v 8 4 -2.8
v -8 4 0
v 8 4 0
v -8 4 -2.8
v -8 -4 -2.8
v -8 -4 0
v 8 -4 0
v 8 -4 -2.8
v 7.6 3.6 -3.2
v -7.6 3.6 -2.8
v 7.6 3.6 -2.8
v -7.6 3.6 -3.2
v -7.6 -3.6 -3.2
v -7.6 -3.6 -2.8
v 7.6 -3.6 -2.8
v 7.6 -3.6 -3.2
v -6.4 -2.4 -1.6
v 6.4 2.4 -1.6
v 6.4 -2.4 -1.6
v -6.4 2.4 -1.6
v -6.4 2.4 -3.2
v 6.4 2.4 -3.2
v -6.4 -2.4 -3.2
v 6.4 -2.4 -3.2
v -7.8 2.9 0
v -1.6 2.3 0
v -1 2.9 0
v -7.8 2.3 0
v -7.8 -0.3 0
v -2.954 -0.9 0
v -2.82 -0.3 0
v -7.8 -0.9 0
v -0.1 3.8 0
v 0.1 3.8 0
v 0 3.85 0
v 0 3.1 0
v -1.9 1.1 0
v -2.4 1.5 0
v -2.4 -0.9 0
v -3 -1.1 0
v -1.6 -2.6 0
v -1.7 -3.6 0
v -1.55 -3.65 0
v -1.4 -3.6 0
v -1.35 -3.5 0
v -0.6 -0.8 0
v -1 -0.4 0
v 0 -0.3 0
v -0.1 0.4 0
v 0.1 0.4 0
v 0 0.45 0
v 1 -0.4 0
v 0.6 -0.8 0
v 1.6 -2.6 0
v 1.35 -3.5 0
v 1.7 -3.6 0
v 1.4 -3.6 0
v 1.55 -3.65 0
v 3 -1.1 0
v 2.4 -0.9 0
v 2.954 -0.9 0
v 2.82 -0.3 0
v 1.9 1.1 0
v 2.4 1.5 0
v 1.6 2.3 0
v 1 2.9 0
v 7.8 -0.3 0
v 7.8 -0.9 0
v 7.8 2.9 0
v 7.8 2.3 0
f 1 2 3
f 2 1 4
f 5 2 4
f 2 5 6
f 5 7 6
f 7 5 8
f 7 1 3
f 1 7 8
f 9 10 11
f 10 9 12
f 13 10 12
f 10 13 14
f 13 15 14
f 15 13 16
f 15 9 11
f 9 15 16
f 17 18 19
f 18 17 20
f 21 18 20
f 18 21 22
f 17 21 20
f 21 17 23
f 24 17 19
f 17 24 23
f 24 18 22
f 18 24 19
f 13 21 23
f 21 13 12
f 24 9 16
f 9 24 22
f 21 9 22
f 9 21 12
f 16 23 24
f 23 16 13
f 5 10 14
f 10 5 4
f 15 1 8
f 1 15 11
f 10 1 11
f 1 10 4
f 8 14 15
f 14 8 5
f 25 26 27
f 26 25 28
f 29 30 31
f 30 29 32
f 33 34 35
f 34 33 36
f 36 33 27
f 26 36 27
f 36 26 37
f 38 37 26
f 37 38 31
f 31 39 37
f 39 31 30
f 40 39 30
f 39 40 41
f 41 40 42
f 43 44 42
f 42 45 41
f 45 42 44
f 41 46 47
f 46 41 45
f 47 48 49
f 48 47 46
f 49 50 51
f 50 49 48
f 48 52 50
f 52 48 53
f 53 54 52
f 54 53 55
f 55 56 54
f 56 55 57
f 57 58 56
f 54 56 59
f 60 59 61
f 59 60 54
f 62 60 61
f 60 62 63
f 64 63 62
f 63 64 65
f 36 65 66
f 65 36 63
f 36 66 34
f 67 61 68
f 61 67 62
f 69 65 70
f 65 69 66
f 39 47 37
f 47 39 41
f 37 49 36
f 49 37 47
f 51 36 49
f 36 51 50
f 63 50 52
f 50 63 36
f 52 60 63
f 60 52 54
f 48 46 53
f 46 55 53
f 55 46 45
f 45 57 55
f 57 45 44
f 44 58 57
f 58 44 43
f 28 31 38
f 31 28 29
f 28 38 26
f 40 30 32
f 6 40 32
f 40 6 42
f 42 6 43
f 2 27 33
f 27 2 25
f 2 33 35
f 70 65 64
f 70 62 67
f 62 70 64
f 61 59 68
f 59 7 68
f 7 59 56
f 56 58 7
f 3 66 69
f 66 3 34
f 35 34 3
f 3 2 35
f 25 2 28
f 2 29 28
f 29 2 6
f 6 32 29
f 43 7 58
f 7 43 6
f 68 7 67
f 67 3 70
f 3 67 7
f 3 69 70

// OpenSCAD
// file: ../p/box5.scad
use <../lib.scad>
function ldraw_lib__box5() = [
// 0 Box with 5 Faces and All Edges
// 0 Name: box5.dat
// 0 Author: James Jessiman
// 0 !LDRAW_ORG Primitive UPDATE 2012-01
// 0 !LICENSE Licensed under CC BY 4.0 : see CAreadme.txt
// 
// 0 BFC CERTIFY CCW
  [0,"BFC","CERTIFY"],
  [0,"BFC","CCW"],
// 
// 0 !HISTORY 2002-04-03 [sbliss] Modified for BFC compliance
// 0 !HISTORY 2002-04-25 [PTadmin] Official Update 2002-02
// 0 !HISTORY 2007-06-24 [PTadmin] Header formatted for Contributor Agreement
// 0 !HISTORY 2008-07-01 [PTadmin] Official Update 2008-01
// 0 !HISTORY 2012-02-16 [Philo] Changed to CCW
// 0 !HISTORY 2012-03-30 [PTadmin] Official Update 2012-01
// 
// 
// 2 24 1 1 1 -1 1 1
  [2,24,1,1,1,-1,1,1],
// 2 24 -1 1 1 -1 1 -1
  [2,24,-1,1,1,-1,1,-1],
// 2 24 -1 1 -1 1 1 -1
  [2,24,-1,1,-1,1,1,-1],
// 2 24 1 1 -1 1 1 1
  [2,24,1,1,-1,1,1,1],
// 2 24 1 0 1 -1 0 1
  [2,24,1,0,1,-1,0,1],
// 2 24 -1 0 1 -1 0 -1
  [2,24,-1,0,1,-1,0,-1],
// 2 24 -1 0 -1 1 0 -1
  [2,24,-1,0,-1,1,0,-1],
// 2 24 1 0 -1 1 0 1
  [2,24,1,0,-1,1,0,1],
// 2 24 1 0 1 1 1 1
  [2,24,1,0,1,1,1,1],
// 2 24 -1 0 1 -1 1 1
  [2,24,-1,0,1,-1,1,1],
// 2 24 1 0 -1 1 1 -1
  [2,24,1,0,-1,1,1,-1],
// 2 24 -1 0 -1 -1 1 -1
  [2,24,-1,0,-1,-1,1,-1],
// 4 16 -1 1 1 1 1 1 1 1 -1 -1 1 -1
  [4,16,-1,1,1,1,1,1,1,1,-1,-1,1,-1],
// 4 16 -1 1 1 -1 0 1 1 0 1 1 1 1
  [4,16,-1,1,1,-1,0,1,1,0,1,1,1,1],
// 4 16 -1 1 -1 -1 0 -1 -1 0 1 -1 1 1
  [4,16,-1,1,-1,-1,0,-1,-1,0,1,-1,1,1],
// 4 16 1 1 -1 1 0 -1 -1 0 -1 -1 1 -1
  [4,16,1,1,-1,1,0,-1,-1,0,-1,-1,1,-1],
// 4 16 1 1 1 1 0 1 1 0 -1 1 1 -1
  [4,16,1,1,1,1,0,1,1,0,-1,1,1,-1],
];
module ldraw_lib__box5(step=0, col=false, unit=2/5, alt=false, line=0.2, solid=!$preview)
    makepoly(ldraw_lib__box5(), step=step, col=col, unit=unit, alt=alt, line=line, solid=solid);
ldraw_lib__box5(line=0.2);
// file: ../p/box4.scad
use <../lib.scad>
function ldraw_lib__box4() = [
// 0 Box with 4 Faces (2 Parallel Pairs) and All Edges
// 0 Name: box4.dat
// 0 Author: James Jessiman
// 0 !LDRAW_ORG Primitive UPDATE 2012-01
// 0 !LICENSE Licensed under CC BY 4.0 : see CAreadme.txt
// 
// 0 BFC CERTIFY CCW
  [0,"BFC","CERTIFY"],
  [0,"BFC","CCW"],
// 
// 0 !HISTORY 2002-04-03 [sbliss] Modified for BFC compliance
// 0 !HISTORY 2002-04-25 [PTadmin] Official Update 2002-02
// 0 !HISTORY 2007-06-24 [PTadmin] Header formatted for Contributor Agreement
// 0 !HISTORY 2008-07-01 [PTadmin] Official Update 2008-01
// 0 !HISTORY 2012-02-16 [Philo] Changed to CCW
// 0 !HISTORY 2012-03-30 [PTadmin] Official Update 2012-01
// 
// 
// 2 24 1 1 1 -1 1 1
  [2,24,1,1,1,-1,1,1],
// 2 24 -1 1 1 -1 1 -1
  [2,24,-1,1,1,-1,1,-1],
// 2 24 -1 1 -1 1 1 -1
  [2,24,-1,1,-1,1,1,-1],
// 2 24 1 1 -1 1 1 1
  [2,24,1,1,-1,1,1,1],
// 2 24 1 0 1 -1 0 1
  [2,24,1,0,1,-1,0,1],
// 2 24 -1 0 1 -1 0 -1
  [2,24,-1,0,1,-1,0,-1],
// 2 24 -1 0 -1 1 0 -1
  [2,24,-1,0,-1,1,0,-1],
// 2 24 1 0 -1 1 0 1
  [2,24,1,0,-1,1,0,1],
// 2 24 1 0 1 1 1 1
  [2,24,1,0,1,1,1,1],
// 2 24 -1 0 1 -1 1 1
  [2,24,-1,0,1,-1,1,1],
// 2 24 1 0 -1 1 1 -1
  [2,24,1,0,-1,1,1,-1],
// 2 24 -1 0 -1 -1 1 -1
  [2,24,-1,0,-1,-1,1,-1],
// 4 16 -1 1 1 -1 0 1 1 0 1 1 1 1
  [4,16,-1,1,1,-1,0,1,1,0,1,1,1,1],
// 4 16 -1 1 -1 -1 0 -1 -1 0 1 -1 1 1
  [4,16,-1,1,-1,-1,0,-1,-1,0,1,-1,1,1],
// 4 16 1 1 -1 1 0 -1 -1 0 -1 -1 1 -1
  [4,16,1,1,-1,1,0,-1,-1,0,-1,-1,1,-1],
// 4 16 1 1 1 1 0 1 1 0 -1 1 1 -1
  [4,16,1,1,1,1,0,1,1,0,-1,1,1,-1],
];
module ldraw_lib__box4(step=0, col=false, unit=2/5, alt=false, line=0.2, solid=!$preview)
    makepoly(ldraw_lib__box4(), step=step, col=col, unit=unit, alt=alt, line=line, solid=solid);
ldraw_lib__box4(line=0.2);
// file: s/3069bs01.scad
use <../../lib.scad>
use <../../p/box4.scad>
use <../../p/box5.scad>
function ldraw_lib__s__3069bs01() = [
// 0 ~Tile  1 x  2 with Groove without Top Face
// 0 Name: s\3069bs01.dat
// 0 Author: Santeri Piippo [arezey]
// 0 !LDRAW_ORG Subpart UPDATE 2010-02
// 0 !LICENSE Licensed under CC BY 4.0 : see CAreadme.txt
// 
// 0 BFC CERTIFY CCW
  [0,"BFC","CERTIFY"],
  [0,"BFC","CCW"],
// 
// 0 !HISTORY 2010-07-05 [PTadmin] Official Update 2010-02
// 
// 
// 1 16 0 0 0 20 0 0 0 7 0 0 0 10 box4.dat
  [1,16,0,0,0,20,0,0,0,7,0,0,0,10, ldraw_lib__box4()],
// 1 16 0 7 0 19 0 0 0 1 0 0 0 9 box4.dat
  [1,16,0,7,0,19,0,0,0,1,0,0,0,9, ldraw_lib__box4()],
// 0 BFC INVERTNEXT
  [0,"BFC","INVERTNEXT"],
// 1 16 0 8 0 16 0 0 0 -4 0 0 0 6 box5.dat
  [1,16,0,8,0,16,0,0,0,-4,0,0,0,6, ldraw_lib__box5()],
// 4 16 -19 8 9 -16 8 6 -16 8 -6 -19 8 -9
  [4,16,-19,8,9,-16,8,6,-16,8,-6,-19,8,-9],
// 4 16 19 8 -9 16 8 -6 16 8 6 19 8 9
  [4,16,19,8,-9,16,8,-6,16,8,6,19,8,9],
// 4 16 19 8 9 16 8 6 -16 8 6 -19 8 9
  [4,16,19,8,9,16,8,6,-16,8,6,-19,8,9],
// 4 16 -19 8 -9 -16 8 -6 16 8 -6 19 8 -9
  [4,16,-19,8,-9,-16,8,-6,16,8,-6,19,8,-9],
// 4 16 -20 7 10 -19 7 9 -19 7 -9 -20 7 -10
  [4,16,-20,7,10,-19,7,9,-19,7,-9,-20,7,-10],
// 4 16 20 7 -10 19 7 -9 19 7 9 20 7 10
  [4,16,20,7,-10,19,7,-9,19,7,9,20,7,10],
// 4 16 20 7 10 19 7 9 -19 7 9 -20 7 10
  [4,16,20,7,10,19,7,9,-19,7,9,-20,7,10],
// 4 16 -20 7 -10 -19 7 -9 19 7 -9 20 7 -10
  [4,16,-20,7,-10,-19,7,-9,19,7,-9,20,7,-10],
// 0 //
];
module ldraw_lib__s__3069bs01(step=0, col=false, unit=2/5, alt=false, line=0.2, solid=!$preview)
    makepoly(ldraw_lib__s__3069bs01(), step=step, col=col, unit=unit, alt=alt, line=line, solid=solid);
ldraw_lib__s__3069bs01(line=0.2);
// main file
use <../lib.scad>
use <s/3069bs01.scad>
function ldraw_lib__3069bpzh() = [
// 0 Tile  1 x  2 with Black Aquaman Logo Pattern
// 0 Name: 3069bpzh.dat
// 0 Author: Vincent Messenet [Cheenzo]
// 0 !LDRAW_ORG Part UPDATE 2020-03
// 0 !LICENSE Licensed under CC BY 4.0 : see CAreadme.txt
// 
// 0 BFC CERTIFY CCW
  [0,"BFC","CERTIFY"],
  [0,"BFC","CCW"],
// 
// 0 !KEYWORDS Brickheadz, BrickLink 3069bpb630, Justice League, Set 41600
// 
// 0 !HISTORY 2020-12-29 [PTadmin] Official Update 2020-03
// 
// 
// 1 16 0 0 0 1 0 0 0 1 0 0 0 1 s\3069bs01.dat
  [1,16,0,0,0,1,0,0,0,1,0,0,0,1, ldraw_lib__s__3069bs01()],
// 
// 4 0 -2.5 0 7.25 -19.5 0 7.25 -19.5 0 5.75 -4 0 5.75
  [4,0,-2.5,0,7.25,-19.5,0,7.25,-19.5,0,5.75,-4,0,5.75],
// 4 0 -7.05 0 -.75 -19.5 0 -.75 -19.5 0 -2.25 -7.385 0 -2.25
  [4,0,-7.05,0,-.75,-19.5,0,-.75,-19.5,0,-2.25,-7.385,0,-2.25],
// 4 0 0 0 7.75 .25 0 9.5 0 0 9.625 -.25 0 9.5
  [4,0,0,0,7.75,.25,0,9.5,0,0,9.625,-.25,0,9.5],
// 3 0 0 0 7.75 -.25 0 9.5 -2.5 0 7.25
  [3,0,0,0,7.75,-.25,0,9.5,-2.5,0,7.25],
// 4 0 0 0 7.75 -2.5 0 7.25 -4 0 5.75 -4.75 0 2.75
  [4,0,0,0,7.75,-2.5,0,7.25,-4,0,5.75,-4.75,0,2.75],
// 4 0 -4 0 5.75 -6 0 3.75 -7.05 0 -.75 -4.75 0 2.75
  [4,0,-4,0,5.75,-6,0,3.75,-7.05,0,-.75,-4.75,0,2.75],
// 4 0 -6 0 -2.25 -4.75 0 2.75 -7.05 0 -.75 -7.385 0 -2.25
  [4,0,-6,0,-2.25,-4.75,0,2.75,-7.05,0,-.75,-7.385,0,-2.25],
// 4 0 -6 0 -2.25 -7.385 0 -2.25 -7.5 0 -2.75 -4 0 -6.5
  [4,0,-6,0,-2.25,-7.385,0,-2.25,-7.5,0,-2.75,-4,0,-6.5],
// 3 0 -4 0 -6.5 -7.5 0 -2.75 -4.25 0 -9
  [3,0,-4,0,-6.5,-7.5,0,-2.75,-4.25,0,-9],
// 3 0 -3.875 0 -9.125 -3.5 0 -9 -4.25 0 -9
  [3,0,-3.875,0,-9.125,-3.5,0,-9,-4.25,0,-9],
// 4 0 -3.375 0 -8.75 -4 0 -6.5 -4.25 0 -9 -3.5 0 -9
  [4,0,-3.375,0,-8.75,-4,0,-6.5,-4.25,0,-9,-3.5,0,-9],
// 4 0 -4 0 -6.5 -3.375 0 -8.75 -1.5 0 -2 -2.5 0 -1
  [4,0,-4,0,-6.5,-3.375,0,-8.75,-1.5,0,-2,-2.5,0,-1],
// 4 0 -2.5 0 -1 -1.5 0 -2 0 0 -.75 -.25 0 1
  [4,0,-2.5,0,-1,-1.5,0,-2,0,0,-.75,-.25,0,1],
// 4 0 -.25 0 1 0 0 -.75 .25 0 1 0 0 1.125
  [4,0,-.25,0,1,0,0,-.75,.25,0,1,0,0,1.125],
// 4 0 2.5 0 -1 .25 0 1 0 0 -.75 1.5 0 -2
  [4,0,2.5,0,-1,.25,0,1,0,0,-.75,1.5,0,-2],
// 4 0 3.375 0 -8.75 4 0 -6.5 2.5 0 -1 1.5 0 -2
  [4,0,3.375,0,-8.75,4,0,-6.5,2.5,0,-1,1.5,0,-2],
// 4 0 4.25 0 -9 4 0 -6.5 3.375 0 -8.75 3.5 0 -9
  [4,0,4.25,0,-9,4,0,-6.5,3.375,0,-8.75,3.5,0,-9],
// 3 0 3.5 0 -9 3.875 0 -9.125 4.25 0 -9
  [3,0,3.5,0,-9,3.875,0,-9.125,4.25,0,-9],
// 3 0 4 0 -6.5 4.25 0 -9 7.5 0 -2.75
  [3,0,4,0,-6.5,4.25,0,-9,7.5,0,-2.75],
// 4 0 7.5 0 -2.75 7.385 0 -2.25 6 0 -2.25 4 0 -6.5
  [4,0,7.5,0,-2.75,7.385,0,-2.25,6,0,-2.25,4,0,-6.5],
// 4 0 6 0 -2.25 7.385 0 -2.25 7.05 0 -.75 4.75 0 2.75
  [4,0,6,0,-2.25,7.385,0,-2.25,7.05,0,-.75,4.75,0,2.75],
// 4 0 4.75 0 2.75 7.05 0 -.75 6 0 3.75 4 0 5.75
  [4,0,4.75,0,2.75,7.05,0,-.75,6,0,3.75,4,0,5.75],
// 4 0 0 0 7.75 4.75 0 2.75 4 0 5.75 2.5 0 7.25
  [4,0,0,0,7.75,4.75,0,2.75,4,0,5.75,2.5,0,7.25],
// 3 0 0 0 7.75 2.5 0 7.25 .25 0 9.5
  [3,0,0,0,7.75,2.5,0,7.25,.25,0,9.5],
// 4 0 7.05 0 -.75 7.385 0 -2.25 19.5 0 -2.25 19.5 0 -.75
  [4,0,7.05,0,-.75,7.385,0,-2.25,19.5,0,-2.25,19.5,0,-.75],
// 4 0 19.5 0 5.75 19.5 0 7.25 2.5 0 7.25 4 0 5.75
  [4,0,19.5,0,5.75,19.5,0,7.25,2.5,0,7.25,4,0,5.75],
// 4 16 -4 0 -6.5 -2.5 0 -1 -4.75 0 2.75 -6 0 -2.25
  [4,16,-4,0,-6.5,-2.5,0,-1,-4.75,0,2.75,-6,0,-2.25],
// 4 16 -4.75 0 2.75 -2.5 0 -1 -.25 0 1 0 0 7.75
  [4,16,-4.75,0,2.75,-2.5,0,-1,-.25,0,1,0,0,7.75],
// 3 16 0 0 1.125 0 0 7.75 -.25 0 1
  [3,16,0,0,1.125,0,0,7.75,-.25,0,1],
// 3 16 0 0 7.75 0 0 1.125 .25 0 1
  [3,16,0,0,7.75,0,0,1.125,.25,0,1],
// 4 16 4.75 0 2.75 0 0 7.75 .25 0 1 2.5 0 -1
  [4,16,4.75,0,2.75,0,0,7.75,.25,0,1,2.5,0,-1],
// 4 16 6 0 -2.25 4.75 0 2.75 2.5 0 -1 4 0 -6.5
  [4,16,6,0,-2.25,4.75,0,2.75,2.5,0,-1,4,0,-6.5],
// 3 16 0 0 -.75 -1.5 0 -2 1.5 0 -2
  [3,16,0,0,-.75,-1.5,0,-2,1.5,0,-2],
// 4 16 3.375 0 -8.75 1.5 0 -2 -1.5 0 -2 -3.375 0 -8.75
  [4,16,3.375,0,-8.75,1.5,0,-2,-1.5,0,-2,-3.375,0,-8.75],
// 4 16 3.375 0 -8.75 -3.375 0 -8.75 -3.5 0 -9 3.5 0 -9
  [4,16,3.375,0,-8.75,-3.375,0,-8.75,-3.5,0,-9,3.5,0,-9],
// 4 16 -3.875 0 -9.125 3.875 0 -9.125 3.5 0 -9 -3.5 0 -9
  [4,16,-3.875,0,-9.125,3.875,0,-9.125,3.5,0,-9,-3.5,0,-9],
// 4 16 -6 0 3.75 -19.5 0 5.75 -19.5 0 -.75 -7.05 0 -.75
  [4,16,-6,0,3.75,-19.5,0,5.75,-19.5,0,-.75,-7.05,0,-.75],
// 3 16 -19.5 0 5.75 -6 0 3.75 -4 0 5.75
  [3,16,-19.5,0,5.75,-6,0,3.75,-4,0,5.75],
// 3 16 -7.5 0 -2.75 -7.385 0 -2.25 -19.5 0 -2.25
  [3,16,-7.5,0,-2.75,-7.385,0,-2.25,-19.5,0,-2.25],
// 4 16 -4.25 0 -9 -7.5 0 -2.75 -19.5 0 -2.25 -20 0 -10
  [4,16,-4.25,0,-9,-7.5,0,-2.75,-19.5,0,-2.25,-20,0,-10],
// 3 16 -4.25 0 -9 -20 0 -10 -3.875 0 -9.125
  [3,16,-4.25,0,-9,-20,0,-10,-3.875,0,-9.125],
// 4 16 -20 0 10 -19.5 0 7.25 -2.5 0 7.25 -.25 0 9.5
  [4,16,-20,0,10,-19.5,0,7.25,-2.5,0,7.25,-.25,0,9.5],
// 3 16 -20 0 10 -.25 0 9.5 0 0 9.625
  [3,16,-20,0,10,-.25,0,9.5,0,0,9.625],
// 3 16 19.5 0 5.75 4 0 5.75 6 0 3.75
  [3,16,19.5,0,5.75,4,0,5.75,6,0,3.75],
// 4 16 19.5 0 -.75 19.5 0 5.75 6 0 3.75 7.05 0 -.75
  [4,16,19.5,0,-.75,19.5,0,5.75,6,0,3.75,7.05,0,-.75],
// 3 16 7.385 0 -2.25 7.5 0 -2.75 19.5 0 -2.25
  [3,16,7.385,0,-2.25,7.5,0,-2.75,19.5,0,-2.25],
// 4 16 19.5 0 -2.25 7.5 0 -2.75 4.25 0 -9 20 0 -10
  [4,16,19.5,0,-2.25,7.5,0,-2.75,4.25,0,-9,20,0,-10],
// 3 16 4.25 0 -9 3.875 0 -9.125 20 0 -10
  [3,16,4.25,0,-9,3.875,0,-9.125,20,0,-10],
// 4 16 .25 0 9.5 2.5 0 7.25 19.5 0 7.25 20 0 10
  [4,16,.25,0,9.5,2.5,0,7.25,19.5,0,7.25,20,0,10],
// 3 16 0 0 9.625 .25 0 9.5 20 0 10
  [3,16,0,0,9.625,.25,0,9.5,20,0,10],
// 3 16 20 0 10 -20 0 10 0 0 9.625
  [3,16,20,0,10,-20,0,10,0,0,9.625],
// 3 16 -19.5 0 7.25 -20 0 10 -19.5 0 5.75
  [3,16,-19.5,0,7.25,-20,0,10,-19.5,0,5.75],
// 4 16 -19.5 0 -.75 -19.5 0 5.75 -20 0 10 -20 0 -10
  [4,16,-19.5,0,-.75,-19.5,0,5.75,-20,0,10,-20,0,-10],
// 3 16 -20 0 -10 -19.5 0 -2.25 -19.5 0 -.75
  [3,16,-20,0,-10,-19.5,0,-2.25,-19.5,0,-.75],
// 4 16 -20 0 -10 20 0 -10 3.875 0 -9.125 -3.875 0 -9.125
  [4,16,-20,0,-10,20,0,-10,3.875,0,-9.125,-3.875,0,-9.125],
// 3 16 19.5 0 -2.25 20 0 -10 19.5 0 -.75
  [3,16,19.5,0,-2.25,20,0,-10,19.5,0,-.75],
// 4 16 20 0 -10 20 0 10 19.5 0 5.75 19.5 0 -.75
  [4,16,20,0,-10,20,0,10,19.5,0,5.75,19.5,0,-.75],
// 3 16 20 0 10 19.5 0 7.25 19.5 0 5.75
  [3,16,20,0,10,19.5,0,7.25,19.5,0,5.75],
];
module ldraw_lib__3069bpzh(step=0, col=false, unit=2/5, alt=false, line=0.2, solid=!$preview)
    makepoly(ldraw_lib__3069bpzh(), step=step, col=col, unit=unit, alt=alt, line=line, solid=solid);
ldraw_lib__3069bpzh(line=0.2);
